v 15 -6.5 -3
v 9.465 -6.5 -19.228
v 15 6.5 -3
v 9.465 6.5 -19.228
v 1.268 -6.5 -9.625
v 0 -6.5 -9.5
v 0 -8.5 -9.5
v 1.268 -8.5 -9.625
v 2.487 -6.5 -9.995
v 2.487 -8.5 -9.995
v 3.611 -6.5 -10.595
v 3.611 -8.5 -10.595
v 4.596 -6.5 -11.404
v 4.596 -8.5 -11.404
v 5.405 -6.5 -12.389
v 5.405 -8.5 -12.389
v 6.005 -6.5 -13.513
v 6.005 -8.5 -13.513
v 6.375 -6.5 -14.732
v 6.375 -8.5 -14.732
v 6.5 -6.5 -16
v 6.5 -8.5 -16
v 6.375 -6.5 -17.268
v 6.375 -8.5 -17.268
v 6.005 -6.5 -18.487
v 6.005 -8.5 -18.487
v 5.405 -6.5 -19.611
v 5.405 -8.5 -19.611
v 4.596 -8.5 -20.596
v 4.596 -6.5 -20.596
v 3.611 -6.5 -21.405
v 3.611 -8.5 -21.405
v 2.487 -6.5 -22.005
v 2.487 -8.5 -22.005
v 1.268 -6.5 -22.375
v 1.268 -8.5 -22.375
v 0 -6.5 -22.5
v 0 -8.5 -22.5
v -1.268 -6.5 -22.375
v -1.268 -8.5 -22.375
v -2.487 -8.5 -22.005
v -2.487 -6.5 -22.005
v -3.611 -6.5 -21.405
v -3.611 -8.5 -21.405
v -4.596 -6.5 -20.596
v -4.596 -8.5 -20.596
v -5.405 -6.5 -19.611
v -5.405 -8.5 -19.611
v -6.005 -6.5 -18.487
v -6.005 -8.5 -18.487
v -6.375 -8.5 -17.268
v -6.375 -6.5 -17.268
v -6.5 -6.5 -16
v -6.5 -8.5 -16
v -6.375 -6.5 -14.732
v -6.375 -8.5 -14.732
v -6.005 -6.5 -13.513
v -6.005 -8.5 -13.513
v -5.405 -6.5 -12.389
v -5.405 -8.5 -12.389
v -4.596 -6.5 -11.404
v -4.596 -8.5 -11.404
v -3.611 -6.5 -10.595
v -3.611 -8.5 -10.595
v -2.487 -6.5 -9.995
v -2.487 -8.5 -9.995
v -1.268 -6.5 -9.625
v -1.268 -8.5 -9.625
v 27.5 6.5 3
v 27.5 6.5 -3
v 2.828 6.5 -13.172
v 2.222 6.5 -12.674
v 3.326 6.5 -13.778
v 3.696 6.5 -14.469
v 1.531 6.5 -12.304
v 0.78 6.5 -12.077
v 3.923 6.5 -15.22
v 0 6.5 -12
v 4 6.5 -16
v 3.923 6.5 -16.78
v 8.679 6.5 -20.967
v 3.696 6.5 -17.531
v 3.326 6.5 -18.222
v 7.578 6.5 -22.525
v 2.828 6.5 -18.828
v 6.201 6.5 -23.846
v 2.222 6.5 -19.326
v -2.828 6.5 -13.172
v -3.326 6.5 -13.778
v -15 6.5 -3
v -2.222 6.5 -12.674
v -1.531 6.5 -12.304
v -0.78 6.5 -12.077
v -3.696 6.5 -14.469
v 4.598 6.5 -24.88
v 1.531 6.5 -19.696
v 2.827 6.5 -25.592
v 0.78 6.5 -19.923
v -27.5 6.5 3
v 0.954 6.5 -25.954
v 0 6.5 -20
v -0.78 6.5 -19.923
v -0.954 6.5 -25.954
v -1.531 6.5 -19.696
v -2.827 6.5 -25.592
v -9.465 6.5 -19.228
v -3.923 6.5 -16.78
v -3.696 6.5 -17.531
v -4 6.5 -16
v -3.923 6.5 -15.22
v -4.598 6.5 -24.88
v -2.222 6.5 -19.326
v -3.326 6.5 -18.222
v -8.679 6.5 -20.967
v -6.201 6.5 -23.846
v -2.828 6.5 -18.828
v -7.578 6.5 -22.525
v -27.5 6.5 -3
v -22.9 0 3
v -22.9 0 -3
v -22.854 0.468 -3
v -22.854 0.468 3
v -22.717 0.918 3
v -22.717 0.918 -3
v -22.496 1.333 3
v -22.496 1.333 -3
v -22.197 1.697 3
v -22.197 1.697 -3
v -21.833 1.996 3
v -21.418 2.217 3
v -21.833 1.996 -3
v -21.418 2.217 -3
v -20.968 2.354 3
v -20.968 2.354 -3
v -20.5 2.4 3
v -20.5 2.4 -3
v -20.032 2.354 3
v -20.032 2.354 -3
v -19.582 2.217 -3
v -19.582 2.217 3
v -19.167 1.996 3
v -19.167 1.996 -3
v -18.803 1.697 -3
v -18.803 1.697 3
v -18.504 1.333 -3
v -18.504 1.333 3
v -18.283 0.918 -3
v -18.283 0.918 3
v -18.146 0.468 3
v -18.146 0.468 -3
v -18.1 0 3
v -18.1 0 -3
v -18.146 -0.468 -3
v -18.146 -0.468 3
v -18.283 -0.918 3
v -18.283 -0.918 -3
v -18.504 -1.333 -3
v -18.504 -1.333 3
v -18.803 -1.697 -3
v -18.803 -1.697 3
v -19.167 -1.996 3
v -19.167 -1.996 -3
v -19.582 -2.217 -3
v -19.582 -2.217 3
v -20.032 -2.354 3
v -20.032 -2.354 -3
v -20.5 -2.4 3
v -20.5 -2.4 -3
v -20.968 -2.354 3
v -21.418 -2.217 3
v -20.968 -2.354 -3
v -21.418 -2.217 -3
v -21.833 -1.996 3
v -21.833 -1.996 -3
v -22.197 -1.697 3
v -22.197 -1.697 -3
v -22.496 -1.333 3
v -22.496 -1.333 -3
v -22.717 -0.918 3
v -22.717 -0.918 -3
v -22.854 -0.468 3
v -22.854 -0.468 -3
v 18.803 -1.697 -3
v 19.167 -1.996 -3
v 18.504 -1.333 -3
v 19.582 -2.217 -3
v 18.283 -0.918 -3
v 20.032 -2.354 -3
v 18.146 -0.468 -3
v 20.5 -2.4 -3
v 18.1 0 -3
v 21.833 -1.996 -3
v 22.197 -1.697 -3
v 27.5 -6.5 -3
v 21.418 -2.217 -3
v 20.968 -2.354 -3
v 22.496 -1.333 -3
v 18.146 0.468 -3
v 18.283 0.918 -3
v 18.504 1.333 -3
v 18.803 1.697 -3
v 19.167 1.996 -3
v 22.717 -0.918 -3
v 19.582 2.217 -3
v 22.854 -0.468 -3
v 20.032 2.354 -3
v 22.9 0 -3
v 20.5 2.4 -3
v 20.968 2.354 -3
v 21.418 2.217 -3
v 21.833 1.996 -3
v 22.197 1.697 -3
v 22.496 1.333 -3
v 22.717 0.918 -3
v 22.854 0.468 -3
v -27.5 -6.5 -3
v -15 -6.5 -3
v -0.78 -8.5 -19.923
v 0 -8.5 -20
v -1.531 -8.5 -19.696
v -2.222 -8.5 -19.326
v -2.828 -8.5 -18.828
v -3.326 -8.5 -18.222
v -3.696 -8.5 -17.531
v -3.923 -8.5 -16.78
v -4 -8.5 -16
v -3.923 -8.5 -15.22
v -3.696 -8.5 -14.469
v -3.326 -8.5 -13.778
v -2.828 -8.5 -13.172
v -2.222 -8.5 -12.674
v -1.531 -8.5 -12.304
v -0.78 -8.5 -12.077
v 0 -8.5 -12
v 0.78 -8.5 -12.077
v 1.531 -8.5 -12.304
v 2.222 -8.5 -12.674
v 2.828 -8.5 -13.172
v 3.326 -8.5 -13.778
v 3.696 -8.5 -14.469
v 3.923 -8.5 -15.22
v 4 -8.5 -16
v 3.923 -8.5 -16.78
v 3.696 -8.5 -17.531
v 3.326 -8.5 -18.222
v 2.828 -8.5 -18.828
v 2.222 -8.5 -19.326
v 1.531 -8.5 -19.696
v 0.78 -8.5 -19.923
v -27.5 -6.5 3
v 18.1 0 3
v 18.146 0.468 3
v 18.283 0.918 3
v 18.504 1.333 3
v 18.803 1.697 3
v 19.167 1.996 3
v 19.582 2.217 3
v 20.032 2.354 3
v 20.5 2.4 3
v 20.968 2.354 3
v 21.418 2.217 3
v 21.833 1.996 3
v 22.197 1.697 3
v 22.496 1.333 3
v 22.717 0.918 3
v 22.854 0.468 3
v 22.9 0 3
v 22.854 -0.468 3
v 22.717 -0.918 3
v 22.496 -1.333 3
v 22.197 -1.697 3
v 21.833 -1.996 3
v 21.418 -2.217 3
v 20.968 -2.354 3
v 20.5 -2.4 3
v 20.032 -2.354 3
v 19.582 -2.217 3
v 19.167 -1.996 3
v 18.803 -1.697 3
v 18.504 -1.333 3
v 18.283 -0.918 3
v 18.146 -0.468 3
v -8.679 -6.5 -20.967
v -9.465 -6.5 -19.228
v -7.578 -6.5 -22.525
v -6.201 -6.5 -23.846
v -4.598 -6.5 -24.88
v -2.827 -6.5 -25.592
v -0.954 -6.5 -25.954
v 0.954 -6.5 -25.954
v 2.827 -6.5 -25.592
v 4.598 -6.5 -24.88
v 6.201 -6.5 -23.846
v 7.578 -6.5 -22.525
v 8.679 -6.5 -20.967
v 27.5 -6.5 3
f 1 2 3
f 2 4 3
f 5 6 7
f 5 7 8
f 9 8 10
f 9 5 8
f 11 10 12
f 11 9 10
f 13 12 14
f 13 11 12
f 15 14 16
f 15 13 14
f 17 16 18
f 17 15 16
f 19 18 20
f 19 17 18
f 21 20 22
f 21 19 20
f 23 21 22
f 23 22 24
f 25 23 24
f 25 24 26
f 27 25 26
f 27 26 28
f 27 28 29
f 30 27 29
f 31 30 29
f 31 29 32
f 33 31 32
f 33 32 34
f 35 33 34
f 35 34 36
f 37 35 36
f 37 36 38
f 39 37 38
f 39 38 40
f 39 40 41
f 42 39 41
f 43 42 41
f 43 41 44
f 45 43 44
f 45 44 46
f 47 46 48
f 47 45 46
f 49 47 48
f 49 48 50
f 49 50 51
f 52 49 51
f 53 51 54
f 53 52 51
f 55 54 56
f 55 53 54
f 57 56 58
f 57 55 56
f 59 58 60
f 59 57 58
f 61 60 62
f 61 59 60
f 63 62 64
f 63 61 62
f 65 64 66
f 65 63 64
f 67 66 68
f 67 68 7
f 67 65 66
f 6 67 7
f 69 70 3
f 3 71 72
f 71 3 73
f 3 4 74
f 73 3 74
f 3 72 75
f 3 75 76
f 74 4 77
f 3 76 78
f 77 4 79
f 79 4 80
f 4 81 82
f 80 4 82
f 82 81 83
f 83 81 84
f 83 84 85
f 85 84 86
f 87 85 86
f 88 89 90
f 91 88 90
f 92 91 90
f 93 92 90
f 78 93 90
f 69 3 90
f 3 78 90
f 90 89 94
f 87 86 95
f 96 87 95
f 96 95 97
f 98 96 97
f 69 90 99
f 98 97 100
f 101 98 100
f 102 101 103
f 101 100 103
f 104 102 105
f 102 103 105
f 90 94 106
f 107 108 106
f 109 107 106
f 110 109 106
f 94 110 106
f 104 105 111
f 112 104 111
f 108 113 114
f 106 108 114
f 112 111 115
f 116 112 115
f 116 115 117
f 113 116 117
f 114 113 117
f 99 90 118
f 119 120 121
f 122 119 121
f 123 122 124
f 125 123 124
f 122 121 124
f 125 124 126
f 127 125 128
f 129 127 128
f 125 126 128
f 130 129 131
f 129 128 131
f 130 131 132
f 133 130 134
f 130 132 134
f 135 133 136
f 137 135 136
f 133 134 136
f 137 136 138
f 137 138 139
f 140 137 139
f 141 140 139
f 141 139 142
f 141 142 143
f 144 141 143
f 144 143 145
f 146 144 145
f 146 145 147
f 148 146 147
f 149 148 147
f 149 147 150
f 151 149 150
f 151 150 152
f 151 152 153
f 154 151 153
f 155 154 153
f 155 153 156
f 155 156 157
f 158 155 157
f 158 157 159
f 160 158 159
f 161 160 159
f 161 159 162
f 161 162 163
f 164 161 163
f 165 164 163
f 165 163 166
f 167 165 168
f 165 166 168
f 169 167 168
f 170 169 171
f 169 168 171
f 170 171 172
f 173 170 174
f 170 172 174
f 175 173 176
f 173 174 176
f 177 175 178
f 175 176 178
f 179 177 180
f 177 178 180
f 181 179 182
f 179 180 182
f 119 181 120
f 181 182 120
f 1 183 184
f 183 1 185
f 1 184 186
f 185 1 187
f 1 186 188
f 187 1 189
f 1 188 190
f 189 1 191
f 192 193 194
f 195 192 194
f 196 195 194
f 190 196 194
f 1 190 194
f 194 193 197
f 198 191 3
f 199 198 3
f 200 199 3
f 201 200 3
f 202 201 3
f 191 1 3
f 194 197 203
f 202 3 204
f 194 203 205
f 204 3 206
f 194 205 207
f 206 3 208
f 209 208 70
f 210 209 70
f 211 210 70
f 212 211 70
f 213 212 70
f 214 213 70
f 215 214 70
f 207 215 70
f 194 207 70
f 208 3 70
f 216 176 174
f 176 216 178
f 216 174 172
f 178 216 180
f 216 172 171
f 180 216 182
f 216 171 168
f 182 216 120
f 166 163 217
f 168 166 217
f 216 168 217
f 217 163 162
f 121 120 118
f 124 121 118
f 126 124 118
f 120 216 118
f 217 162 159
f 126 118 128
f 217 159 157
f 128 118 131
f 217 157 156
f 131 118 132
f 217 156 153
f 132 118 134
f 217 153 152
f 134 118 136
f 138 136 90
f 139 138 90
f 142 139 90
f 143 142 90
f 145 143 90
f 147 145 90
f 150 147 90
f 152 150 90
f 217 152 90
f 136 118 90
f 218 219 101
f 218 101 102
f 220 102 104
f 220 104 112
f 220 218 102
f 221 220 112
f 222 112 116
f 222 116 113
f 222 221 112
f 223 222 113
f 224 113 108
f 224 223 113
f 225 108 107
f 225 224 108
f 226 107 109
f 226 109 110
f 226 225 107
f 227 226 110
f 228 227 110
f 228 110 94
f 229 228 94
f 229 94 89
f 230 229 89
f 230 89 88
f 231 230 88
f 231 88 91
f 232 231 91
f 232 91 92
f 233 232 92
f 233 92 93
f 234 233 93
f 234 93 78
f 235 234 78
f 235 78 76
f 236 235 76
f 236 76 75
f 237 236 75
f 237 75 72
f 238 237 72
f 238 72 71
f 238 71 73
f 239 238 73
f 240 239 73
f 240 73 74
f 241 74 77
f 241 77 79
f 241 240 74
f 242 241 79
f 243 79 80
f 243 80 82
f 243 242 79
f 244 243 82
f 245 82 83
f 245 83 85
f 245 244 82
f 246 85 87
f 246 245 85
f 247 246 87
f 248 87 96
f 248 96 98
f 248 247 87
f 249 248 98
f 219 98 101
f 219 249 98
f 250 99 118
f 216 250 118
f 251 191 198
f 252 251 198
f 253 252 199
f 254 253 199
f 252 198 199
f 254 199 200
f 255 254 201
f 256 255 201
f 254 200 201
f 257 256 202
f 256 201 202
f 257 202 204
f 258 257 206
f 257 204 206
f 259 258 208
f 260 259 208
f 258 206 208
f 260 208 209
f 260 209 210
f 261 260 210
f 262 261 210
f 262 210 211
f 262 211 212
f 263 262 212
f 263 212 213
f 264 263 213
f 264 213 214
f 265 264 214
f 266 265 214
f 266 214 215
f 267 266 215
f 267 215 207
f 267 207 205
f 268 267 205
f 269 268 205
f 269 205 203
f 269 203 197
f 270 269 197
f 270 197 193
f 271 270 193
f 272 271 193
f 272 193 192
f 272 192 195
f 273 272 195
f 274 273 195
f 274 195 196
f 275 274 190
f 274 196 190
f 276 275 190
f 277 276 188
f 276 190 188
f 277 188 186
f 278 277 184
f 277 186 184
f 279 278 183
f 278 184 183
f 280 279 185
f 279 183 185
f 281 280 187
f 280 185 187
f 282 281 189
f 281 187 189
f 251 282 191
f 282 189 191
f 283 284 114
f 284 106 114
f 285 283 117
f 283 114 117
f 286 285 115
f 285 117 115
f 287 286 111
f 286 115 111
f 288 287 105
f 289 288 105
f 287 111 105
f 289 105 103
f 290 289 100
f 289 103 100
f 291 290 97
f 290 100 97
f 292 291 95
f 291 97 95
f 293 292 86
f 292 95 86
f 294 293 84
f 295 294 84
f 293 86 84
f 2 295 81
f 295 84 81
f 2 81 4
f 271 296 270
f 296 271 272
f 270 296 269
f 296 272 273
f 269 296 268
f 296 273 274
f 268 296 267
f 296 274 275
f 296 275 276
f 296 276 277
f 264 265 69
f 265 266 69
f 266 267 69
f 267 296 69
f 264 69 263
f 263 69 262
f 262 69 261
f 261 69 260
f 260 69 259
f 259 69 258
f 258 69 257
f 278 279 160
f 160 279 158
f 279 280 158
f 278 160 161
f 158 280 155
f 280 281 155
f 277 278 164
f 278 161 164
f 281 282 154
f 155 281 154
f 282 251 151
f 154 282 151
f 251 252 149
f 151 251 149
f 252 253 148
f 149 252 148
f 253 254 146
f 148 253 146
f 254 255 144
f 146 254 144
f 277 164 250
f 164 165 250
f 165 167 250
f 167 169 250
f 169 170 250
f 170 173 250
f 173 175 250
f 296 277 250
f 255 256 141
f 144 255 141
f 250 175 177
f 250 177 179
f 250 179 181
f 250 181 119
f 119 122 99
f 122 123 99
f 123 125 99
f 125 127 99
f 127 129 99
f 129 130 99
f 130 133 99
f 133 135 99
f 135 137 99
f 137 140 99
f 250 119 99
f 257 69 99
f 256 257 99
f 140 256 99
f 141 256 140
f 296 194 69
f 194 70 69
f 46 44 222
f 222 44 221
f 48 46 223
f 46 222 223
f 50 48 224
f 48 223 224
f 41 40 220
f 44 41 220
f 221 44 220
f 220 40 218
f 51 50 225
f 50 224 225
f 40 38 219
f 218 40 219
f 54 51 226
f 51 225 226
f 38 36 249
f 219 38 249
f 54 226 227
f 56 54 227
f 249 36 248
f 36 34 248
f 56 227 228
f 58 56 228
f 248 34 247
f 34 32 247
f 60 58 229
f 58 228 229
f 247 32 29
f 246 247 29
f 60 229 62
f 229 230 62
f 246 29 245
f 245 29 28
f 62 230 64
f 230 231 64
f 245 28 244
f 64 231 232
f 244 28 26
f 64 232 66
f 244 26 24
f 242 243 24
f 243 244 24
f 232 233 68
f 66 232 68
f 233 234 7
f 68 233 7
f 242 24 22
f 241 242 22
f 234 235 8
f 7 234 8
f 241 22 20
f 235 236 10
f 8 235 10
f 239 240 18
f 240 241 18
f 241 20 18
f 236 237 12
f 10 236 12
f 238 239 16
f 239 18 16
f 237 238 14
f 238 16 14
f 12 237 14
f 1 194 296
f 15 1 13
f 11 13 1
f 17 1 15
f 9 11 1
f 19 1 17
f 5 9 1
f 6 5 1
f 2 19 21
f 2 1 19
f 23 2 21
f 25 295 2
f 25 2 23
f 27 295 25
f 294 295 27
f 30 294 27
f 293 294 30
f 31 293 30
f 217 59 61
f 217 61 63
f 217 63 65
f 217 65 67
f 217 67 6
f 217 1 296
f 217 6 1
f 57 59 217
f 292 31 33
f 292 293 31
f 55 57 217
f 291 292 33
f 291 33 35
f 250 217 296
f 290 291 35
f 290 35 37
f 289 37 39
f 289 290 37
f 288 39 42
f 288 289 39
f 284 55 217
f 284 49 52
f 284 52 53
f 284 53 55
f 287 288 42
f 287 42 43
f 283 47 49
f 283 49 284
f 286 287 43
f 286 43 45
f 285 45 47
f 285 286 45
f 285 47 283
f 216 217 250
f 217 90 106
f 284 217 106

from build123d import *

# Parameters (mm, degrees)
SKETCH_1_R          = 4
EXTRUDE_1_DEPTH     = 6.5
SKETCH_3_R          = 6.5
EXTRUDE_2_DEPTH     = 12
SKETCH_2_R          = 2.4
CUT_EXTRUDE_1_DEPTH = 16
CUT_EXTRUDE_START   = -12
SKETCH_4_R          = 4
CUT_EXTRUDE_2_DEPTH = 12


with BuildPart() as part:
    # 草图1 → 凸台-拉伸1 (new, symmetric)
    with BuildSketch(Plane(origin=(0, 0, 0), x_dir=(1, 0, 0), z_dir=(0, 1, 0))):
        with BuildLine():
            Line((-15, 3), (-9.464557528, 19.228335609))
            ThreePointArc((-9.464557528, 19.228335609), (0, 26), (9.464557528, 19.228335609))
            Line((9.464557528, 19.228335609), (15, 3))
            Line((15, 3), (27.5, 3))
            Line((27.5, 3), (27.5, -3))
            Line((27.5, -3), (-27.5, -3))
            Line((-27.5, -3), (-27.5, 3))
            Line((-27.5, 3), (-15, 3))
        make_face()
        with Locations(Location((0, 16, 0), (0, 0, 90))):
            Circle(SKETCH_1_R, mode=Mode.SUBTRACT)
    extrude(amount=EXTRUDE_1_DEPTH, both=True)

    # 草图3 → 凸台-拉伸2 (add)
    with BuildSketch(Plane(origin=(0, 3.5, 0), x_dir=(1, 0, 0), z_dir=(0, 1, 0))):
        with Locations(Location((0, 16, 0), (0, 0, 270))):
            Circle(SKETCH_3_R)
    extrude(amount=-EXTRUDE_2_DEPTH)

    # 草图2 → 切除-拉伸1 (cut)
    with BuildSketch(Plane(origin=(0, 0, -3), x_dir=(-1, 0, 0), z_dir=(0, 0, -1))):
        with Locations((20.5, 0)):
            Circle(SKETCH_2_R)
        with Locations((-20.5, 0)):
            Circle(SKETCH_2_R)
    extrude(amount=-CUT_EXTRUDE_1_DEPTH, mode=Mode.SUBTRACT)

    # 草图4 → 切除-拉伸2 (cut)
    with BuildSketch(Plane(origin=(0, 3.5, 0), x_dir=(1, 0, 0), z_dir=(0, 1, 0)).offset(CUT_EXTRUDE_START)):
        with Locations(Location((0, 16, 0), (0, 0, 90))):
            Circle(SKETCH_4_R)
    extrude(amount=CUT_EXTRUDE_2_DEPTH, mode=Mode.SUBTRACT)


solid = part.part
